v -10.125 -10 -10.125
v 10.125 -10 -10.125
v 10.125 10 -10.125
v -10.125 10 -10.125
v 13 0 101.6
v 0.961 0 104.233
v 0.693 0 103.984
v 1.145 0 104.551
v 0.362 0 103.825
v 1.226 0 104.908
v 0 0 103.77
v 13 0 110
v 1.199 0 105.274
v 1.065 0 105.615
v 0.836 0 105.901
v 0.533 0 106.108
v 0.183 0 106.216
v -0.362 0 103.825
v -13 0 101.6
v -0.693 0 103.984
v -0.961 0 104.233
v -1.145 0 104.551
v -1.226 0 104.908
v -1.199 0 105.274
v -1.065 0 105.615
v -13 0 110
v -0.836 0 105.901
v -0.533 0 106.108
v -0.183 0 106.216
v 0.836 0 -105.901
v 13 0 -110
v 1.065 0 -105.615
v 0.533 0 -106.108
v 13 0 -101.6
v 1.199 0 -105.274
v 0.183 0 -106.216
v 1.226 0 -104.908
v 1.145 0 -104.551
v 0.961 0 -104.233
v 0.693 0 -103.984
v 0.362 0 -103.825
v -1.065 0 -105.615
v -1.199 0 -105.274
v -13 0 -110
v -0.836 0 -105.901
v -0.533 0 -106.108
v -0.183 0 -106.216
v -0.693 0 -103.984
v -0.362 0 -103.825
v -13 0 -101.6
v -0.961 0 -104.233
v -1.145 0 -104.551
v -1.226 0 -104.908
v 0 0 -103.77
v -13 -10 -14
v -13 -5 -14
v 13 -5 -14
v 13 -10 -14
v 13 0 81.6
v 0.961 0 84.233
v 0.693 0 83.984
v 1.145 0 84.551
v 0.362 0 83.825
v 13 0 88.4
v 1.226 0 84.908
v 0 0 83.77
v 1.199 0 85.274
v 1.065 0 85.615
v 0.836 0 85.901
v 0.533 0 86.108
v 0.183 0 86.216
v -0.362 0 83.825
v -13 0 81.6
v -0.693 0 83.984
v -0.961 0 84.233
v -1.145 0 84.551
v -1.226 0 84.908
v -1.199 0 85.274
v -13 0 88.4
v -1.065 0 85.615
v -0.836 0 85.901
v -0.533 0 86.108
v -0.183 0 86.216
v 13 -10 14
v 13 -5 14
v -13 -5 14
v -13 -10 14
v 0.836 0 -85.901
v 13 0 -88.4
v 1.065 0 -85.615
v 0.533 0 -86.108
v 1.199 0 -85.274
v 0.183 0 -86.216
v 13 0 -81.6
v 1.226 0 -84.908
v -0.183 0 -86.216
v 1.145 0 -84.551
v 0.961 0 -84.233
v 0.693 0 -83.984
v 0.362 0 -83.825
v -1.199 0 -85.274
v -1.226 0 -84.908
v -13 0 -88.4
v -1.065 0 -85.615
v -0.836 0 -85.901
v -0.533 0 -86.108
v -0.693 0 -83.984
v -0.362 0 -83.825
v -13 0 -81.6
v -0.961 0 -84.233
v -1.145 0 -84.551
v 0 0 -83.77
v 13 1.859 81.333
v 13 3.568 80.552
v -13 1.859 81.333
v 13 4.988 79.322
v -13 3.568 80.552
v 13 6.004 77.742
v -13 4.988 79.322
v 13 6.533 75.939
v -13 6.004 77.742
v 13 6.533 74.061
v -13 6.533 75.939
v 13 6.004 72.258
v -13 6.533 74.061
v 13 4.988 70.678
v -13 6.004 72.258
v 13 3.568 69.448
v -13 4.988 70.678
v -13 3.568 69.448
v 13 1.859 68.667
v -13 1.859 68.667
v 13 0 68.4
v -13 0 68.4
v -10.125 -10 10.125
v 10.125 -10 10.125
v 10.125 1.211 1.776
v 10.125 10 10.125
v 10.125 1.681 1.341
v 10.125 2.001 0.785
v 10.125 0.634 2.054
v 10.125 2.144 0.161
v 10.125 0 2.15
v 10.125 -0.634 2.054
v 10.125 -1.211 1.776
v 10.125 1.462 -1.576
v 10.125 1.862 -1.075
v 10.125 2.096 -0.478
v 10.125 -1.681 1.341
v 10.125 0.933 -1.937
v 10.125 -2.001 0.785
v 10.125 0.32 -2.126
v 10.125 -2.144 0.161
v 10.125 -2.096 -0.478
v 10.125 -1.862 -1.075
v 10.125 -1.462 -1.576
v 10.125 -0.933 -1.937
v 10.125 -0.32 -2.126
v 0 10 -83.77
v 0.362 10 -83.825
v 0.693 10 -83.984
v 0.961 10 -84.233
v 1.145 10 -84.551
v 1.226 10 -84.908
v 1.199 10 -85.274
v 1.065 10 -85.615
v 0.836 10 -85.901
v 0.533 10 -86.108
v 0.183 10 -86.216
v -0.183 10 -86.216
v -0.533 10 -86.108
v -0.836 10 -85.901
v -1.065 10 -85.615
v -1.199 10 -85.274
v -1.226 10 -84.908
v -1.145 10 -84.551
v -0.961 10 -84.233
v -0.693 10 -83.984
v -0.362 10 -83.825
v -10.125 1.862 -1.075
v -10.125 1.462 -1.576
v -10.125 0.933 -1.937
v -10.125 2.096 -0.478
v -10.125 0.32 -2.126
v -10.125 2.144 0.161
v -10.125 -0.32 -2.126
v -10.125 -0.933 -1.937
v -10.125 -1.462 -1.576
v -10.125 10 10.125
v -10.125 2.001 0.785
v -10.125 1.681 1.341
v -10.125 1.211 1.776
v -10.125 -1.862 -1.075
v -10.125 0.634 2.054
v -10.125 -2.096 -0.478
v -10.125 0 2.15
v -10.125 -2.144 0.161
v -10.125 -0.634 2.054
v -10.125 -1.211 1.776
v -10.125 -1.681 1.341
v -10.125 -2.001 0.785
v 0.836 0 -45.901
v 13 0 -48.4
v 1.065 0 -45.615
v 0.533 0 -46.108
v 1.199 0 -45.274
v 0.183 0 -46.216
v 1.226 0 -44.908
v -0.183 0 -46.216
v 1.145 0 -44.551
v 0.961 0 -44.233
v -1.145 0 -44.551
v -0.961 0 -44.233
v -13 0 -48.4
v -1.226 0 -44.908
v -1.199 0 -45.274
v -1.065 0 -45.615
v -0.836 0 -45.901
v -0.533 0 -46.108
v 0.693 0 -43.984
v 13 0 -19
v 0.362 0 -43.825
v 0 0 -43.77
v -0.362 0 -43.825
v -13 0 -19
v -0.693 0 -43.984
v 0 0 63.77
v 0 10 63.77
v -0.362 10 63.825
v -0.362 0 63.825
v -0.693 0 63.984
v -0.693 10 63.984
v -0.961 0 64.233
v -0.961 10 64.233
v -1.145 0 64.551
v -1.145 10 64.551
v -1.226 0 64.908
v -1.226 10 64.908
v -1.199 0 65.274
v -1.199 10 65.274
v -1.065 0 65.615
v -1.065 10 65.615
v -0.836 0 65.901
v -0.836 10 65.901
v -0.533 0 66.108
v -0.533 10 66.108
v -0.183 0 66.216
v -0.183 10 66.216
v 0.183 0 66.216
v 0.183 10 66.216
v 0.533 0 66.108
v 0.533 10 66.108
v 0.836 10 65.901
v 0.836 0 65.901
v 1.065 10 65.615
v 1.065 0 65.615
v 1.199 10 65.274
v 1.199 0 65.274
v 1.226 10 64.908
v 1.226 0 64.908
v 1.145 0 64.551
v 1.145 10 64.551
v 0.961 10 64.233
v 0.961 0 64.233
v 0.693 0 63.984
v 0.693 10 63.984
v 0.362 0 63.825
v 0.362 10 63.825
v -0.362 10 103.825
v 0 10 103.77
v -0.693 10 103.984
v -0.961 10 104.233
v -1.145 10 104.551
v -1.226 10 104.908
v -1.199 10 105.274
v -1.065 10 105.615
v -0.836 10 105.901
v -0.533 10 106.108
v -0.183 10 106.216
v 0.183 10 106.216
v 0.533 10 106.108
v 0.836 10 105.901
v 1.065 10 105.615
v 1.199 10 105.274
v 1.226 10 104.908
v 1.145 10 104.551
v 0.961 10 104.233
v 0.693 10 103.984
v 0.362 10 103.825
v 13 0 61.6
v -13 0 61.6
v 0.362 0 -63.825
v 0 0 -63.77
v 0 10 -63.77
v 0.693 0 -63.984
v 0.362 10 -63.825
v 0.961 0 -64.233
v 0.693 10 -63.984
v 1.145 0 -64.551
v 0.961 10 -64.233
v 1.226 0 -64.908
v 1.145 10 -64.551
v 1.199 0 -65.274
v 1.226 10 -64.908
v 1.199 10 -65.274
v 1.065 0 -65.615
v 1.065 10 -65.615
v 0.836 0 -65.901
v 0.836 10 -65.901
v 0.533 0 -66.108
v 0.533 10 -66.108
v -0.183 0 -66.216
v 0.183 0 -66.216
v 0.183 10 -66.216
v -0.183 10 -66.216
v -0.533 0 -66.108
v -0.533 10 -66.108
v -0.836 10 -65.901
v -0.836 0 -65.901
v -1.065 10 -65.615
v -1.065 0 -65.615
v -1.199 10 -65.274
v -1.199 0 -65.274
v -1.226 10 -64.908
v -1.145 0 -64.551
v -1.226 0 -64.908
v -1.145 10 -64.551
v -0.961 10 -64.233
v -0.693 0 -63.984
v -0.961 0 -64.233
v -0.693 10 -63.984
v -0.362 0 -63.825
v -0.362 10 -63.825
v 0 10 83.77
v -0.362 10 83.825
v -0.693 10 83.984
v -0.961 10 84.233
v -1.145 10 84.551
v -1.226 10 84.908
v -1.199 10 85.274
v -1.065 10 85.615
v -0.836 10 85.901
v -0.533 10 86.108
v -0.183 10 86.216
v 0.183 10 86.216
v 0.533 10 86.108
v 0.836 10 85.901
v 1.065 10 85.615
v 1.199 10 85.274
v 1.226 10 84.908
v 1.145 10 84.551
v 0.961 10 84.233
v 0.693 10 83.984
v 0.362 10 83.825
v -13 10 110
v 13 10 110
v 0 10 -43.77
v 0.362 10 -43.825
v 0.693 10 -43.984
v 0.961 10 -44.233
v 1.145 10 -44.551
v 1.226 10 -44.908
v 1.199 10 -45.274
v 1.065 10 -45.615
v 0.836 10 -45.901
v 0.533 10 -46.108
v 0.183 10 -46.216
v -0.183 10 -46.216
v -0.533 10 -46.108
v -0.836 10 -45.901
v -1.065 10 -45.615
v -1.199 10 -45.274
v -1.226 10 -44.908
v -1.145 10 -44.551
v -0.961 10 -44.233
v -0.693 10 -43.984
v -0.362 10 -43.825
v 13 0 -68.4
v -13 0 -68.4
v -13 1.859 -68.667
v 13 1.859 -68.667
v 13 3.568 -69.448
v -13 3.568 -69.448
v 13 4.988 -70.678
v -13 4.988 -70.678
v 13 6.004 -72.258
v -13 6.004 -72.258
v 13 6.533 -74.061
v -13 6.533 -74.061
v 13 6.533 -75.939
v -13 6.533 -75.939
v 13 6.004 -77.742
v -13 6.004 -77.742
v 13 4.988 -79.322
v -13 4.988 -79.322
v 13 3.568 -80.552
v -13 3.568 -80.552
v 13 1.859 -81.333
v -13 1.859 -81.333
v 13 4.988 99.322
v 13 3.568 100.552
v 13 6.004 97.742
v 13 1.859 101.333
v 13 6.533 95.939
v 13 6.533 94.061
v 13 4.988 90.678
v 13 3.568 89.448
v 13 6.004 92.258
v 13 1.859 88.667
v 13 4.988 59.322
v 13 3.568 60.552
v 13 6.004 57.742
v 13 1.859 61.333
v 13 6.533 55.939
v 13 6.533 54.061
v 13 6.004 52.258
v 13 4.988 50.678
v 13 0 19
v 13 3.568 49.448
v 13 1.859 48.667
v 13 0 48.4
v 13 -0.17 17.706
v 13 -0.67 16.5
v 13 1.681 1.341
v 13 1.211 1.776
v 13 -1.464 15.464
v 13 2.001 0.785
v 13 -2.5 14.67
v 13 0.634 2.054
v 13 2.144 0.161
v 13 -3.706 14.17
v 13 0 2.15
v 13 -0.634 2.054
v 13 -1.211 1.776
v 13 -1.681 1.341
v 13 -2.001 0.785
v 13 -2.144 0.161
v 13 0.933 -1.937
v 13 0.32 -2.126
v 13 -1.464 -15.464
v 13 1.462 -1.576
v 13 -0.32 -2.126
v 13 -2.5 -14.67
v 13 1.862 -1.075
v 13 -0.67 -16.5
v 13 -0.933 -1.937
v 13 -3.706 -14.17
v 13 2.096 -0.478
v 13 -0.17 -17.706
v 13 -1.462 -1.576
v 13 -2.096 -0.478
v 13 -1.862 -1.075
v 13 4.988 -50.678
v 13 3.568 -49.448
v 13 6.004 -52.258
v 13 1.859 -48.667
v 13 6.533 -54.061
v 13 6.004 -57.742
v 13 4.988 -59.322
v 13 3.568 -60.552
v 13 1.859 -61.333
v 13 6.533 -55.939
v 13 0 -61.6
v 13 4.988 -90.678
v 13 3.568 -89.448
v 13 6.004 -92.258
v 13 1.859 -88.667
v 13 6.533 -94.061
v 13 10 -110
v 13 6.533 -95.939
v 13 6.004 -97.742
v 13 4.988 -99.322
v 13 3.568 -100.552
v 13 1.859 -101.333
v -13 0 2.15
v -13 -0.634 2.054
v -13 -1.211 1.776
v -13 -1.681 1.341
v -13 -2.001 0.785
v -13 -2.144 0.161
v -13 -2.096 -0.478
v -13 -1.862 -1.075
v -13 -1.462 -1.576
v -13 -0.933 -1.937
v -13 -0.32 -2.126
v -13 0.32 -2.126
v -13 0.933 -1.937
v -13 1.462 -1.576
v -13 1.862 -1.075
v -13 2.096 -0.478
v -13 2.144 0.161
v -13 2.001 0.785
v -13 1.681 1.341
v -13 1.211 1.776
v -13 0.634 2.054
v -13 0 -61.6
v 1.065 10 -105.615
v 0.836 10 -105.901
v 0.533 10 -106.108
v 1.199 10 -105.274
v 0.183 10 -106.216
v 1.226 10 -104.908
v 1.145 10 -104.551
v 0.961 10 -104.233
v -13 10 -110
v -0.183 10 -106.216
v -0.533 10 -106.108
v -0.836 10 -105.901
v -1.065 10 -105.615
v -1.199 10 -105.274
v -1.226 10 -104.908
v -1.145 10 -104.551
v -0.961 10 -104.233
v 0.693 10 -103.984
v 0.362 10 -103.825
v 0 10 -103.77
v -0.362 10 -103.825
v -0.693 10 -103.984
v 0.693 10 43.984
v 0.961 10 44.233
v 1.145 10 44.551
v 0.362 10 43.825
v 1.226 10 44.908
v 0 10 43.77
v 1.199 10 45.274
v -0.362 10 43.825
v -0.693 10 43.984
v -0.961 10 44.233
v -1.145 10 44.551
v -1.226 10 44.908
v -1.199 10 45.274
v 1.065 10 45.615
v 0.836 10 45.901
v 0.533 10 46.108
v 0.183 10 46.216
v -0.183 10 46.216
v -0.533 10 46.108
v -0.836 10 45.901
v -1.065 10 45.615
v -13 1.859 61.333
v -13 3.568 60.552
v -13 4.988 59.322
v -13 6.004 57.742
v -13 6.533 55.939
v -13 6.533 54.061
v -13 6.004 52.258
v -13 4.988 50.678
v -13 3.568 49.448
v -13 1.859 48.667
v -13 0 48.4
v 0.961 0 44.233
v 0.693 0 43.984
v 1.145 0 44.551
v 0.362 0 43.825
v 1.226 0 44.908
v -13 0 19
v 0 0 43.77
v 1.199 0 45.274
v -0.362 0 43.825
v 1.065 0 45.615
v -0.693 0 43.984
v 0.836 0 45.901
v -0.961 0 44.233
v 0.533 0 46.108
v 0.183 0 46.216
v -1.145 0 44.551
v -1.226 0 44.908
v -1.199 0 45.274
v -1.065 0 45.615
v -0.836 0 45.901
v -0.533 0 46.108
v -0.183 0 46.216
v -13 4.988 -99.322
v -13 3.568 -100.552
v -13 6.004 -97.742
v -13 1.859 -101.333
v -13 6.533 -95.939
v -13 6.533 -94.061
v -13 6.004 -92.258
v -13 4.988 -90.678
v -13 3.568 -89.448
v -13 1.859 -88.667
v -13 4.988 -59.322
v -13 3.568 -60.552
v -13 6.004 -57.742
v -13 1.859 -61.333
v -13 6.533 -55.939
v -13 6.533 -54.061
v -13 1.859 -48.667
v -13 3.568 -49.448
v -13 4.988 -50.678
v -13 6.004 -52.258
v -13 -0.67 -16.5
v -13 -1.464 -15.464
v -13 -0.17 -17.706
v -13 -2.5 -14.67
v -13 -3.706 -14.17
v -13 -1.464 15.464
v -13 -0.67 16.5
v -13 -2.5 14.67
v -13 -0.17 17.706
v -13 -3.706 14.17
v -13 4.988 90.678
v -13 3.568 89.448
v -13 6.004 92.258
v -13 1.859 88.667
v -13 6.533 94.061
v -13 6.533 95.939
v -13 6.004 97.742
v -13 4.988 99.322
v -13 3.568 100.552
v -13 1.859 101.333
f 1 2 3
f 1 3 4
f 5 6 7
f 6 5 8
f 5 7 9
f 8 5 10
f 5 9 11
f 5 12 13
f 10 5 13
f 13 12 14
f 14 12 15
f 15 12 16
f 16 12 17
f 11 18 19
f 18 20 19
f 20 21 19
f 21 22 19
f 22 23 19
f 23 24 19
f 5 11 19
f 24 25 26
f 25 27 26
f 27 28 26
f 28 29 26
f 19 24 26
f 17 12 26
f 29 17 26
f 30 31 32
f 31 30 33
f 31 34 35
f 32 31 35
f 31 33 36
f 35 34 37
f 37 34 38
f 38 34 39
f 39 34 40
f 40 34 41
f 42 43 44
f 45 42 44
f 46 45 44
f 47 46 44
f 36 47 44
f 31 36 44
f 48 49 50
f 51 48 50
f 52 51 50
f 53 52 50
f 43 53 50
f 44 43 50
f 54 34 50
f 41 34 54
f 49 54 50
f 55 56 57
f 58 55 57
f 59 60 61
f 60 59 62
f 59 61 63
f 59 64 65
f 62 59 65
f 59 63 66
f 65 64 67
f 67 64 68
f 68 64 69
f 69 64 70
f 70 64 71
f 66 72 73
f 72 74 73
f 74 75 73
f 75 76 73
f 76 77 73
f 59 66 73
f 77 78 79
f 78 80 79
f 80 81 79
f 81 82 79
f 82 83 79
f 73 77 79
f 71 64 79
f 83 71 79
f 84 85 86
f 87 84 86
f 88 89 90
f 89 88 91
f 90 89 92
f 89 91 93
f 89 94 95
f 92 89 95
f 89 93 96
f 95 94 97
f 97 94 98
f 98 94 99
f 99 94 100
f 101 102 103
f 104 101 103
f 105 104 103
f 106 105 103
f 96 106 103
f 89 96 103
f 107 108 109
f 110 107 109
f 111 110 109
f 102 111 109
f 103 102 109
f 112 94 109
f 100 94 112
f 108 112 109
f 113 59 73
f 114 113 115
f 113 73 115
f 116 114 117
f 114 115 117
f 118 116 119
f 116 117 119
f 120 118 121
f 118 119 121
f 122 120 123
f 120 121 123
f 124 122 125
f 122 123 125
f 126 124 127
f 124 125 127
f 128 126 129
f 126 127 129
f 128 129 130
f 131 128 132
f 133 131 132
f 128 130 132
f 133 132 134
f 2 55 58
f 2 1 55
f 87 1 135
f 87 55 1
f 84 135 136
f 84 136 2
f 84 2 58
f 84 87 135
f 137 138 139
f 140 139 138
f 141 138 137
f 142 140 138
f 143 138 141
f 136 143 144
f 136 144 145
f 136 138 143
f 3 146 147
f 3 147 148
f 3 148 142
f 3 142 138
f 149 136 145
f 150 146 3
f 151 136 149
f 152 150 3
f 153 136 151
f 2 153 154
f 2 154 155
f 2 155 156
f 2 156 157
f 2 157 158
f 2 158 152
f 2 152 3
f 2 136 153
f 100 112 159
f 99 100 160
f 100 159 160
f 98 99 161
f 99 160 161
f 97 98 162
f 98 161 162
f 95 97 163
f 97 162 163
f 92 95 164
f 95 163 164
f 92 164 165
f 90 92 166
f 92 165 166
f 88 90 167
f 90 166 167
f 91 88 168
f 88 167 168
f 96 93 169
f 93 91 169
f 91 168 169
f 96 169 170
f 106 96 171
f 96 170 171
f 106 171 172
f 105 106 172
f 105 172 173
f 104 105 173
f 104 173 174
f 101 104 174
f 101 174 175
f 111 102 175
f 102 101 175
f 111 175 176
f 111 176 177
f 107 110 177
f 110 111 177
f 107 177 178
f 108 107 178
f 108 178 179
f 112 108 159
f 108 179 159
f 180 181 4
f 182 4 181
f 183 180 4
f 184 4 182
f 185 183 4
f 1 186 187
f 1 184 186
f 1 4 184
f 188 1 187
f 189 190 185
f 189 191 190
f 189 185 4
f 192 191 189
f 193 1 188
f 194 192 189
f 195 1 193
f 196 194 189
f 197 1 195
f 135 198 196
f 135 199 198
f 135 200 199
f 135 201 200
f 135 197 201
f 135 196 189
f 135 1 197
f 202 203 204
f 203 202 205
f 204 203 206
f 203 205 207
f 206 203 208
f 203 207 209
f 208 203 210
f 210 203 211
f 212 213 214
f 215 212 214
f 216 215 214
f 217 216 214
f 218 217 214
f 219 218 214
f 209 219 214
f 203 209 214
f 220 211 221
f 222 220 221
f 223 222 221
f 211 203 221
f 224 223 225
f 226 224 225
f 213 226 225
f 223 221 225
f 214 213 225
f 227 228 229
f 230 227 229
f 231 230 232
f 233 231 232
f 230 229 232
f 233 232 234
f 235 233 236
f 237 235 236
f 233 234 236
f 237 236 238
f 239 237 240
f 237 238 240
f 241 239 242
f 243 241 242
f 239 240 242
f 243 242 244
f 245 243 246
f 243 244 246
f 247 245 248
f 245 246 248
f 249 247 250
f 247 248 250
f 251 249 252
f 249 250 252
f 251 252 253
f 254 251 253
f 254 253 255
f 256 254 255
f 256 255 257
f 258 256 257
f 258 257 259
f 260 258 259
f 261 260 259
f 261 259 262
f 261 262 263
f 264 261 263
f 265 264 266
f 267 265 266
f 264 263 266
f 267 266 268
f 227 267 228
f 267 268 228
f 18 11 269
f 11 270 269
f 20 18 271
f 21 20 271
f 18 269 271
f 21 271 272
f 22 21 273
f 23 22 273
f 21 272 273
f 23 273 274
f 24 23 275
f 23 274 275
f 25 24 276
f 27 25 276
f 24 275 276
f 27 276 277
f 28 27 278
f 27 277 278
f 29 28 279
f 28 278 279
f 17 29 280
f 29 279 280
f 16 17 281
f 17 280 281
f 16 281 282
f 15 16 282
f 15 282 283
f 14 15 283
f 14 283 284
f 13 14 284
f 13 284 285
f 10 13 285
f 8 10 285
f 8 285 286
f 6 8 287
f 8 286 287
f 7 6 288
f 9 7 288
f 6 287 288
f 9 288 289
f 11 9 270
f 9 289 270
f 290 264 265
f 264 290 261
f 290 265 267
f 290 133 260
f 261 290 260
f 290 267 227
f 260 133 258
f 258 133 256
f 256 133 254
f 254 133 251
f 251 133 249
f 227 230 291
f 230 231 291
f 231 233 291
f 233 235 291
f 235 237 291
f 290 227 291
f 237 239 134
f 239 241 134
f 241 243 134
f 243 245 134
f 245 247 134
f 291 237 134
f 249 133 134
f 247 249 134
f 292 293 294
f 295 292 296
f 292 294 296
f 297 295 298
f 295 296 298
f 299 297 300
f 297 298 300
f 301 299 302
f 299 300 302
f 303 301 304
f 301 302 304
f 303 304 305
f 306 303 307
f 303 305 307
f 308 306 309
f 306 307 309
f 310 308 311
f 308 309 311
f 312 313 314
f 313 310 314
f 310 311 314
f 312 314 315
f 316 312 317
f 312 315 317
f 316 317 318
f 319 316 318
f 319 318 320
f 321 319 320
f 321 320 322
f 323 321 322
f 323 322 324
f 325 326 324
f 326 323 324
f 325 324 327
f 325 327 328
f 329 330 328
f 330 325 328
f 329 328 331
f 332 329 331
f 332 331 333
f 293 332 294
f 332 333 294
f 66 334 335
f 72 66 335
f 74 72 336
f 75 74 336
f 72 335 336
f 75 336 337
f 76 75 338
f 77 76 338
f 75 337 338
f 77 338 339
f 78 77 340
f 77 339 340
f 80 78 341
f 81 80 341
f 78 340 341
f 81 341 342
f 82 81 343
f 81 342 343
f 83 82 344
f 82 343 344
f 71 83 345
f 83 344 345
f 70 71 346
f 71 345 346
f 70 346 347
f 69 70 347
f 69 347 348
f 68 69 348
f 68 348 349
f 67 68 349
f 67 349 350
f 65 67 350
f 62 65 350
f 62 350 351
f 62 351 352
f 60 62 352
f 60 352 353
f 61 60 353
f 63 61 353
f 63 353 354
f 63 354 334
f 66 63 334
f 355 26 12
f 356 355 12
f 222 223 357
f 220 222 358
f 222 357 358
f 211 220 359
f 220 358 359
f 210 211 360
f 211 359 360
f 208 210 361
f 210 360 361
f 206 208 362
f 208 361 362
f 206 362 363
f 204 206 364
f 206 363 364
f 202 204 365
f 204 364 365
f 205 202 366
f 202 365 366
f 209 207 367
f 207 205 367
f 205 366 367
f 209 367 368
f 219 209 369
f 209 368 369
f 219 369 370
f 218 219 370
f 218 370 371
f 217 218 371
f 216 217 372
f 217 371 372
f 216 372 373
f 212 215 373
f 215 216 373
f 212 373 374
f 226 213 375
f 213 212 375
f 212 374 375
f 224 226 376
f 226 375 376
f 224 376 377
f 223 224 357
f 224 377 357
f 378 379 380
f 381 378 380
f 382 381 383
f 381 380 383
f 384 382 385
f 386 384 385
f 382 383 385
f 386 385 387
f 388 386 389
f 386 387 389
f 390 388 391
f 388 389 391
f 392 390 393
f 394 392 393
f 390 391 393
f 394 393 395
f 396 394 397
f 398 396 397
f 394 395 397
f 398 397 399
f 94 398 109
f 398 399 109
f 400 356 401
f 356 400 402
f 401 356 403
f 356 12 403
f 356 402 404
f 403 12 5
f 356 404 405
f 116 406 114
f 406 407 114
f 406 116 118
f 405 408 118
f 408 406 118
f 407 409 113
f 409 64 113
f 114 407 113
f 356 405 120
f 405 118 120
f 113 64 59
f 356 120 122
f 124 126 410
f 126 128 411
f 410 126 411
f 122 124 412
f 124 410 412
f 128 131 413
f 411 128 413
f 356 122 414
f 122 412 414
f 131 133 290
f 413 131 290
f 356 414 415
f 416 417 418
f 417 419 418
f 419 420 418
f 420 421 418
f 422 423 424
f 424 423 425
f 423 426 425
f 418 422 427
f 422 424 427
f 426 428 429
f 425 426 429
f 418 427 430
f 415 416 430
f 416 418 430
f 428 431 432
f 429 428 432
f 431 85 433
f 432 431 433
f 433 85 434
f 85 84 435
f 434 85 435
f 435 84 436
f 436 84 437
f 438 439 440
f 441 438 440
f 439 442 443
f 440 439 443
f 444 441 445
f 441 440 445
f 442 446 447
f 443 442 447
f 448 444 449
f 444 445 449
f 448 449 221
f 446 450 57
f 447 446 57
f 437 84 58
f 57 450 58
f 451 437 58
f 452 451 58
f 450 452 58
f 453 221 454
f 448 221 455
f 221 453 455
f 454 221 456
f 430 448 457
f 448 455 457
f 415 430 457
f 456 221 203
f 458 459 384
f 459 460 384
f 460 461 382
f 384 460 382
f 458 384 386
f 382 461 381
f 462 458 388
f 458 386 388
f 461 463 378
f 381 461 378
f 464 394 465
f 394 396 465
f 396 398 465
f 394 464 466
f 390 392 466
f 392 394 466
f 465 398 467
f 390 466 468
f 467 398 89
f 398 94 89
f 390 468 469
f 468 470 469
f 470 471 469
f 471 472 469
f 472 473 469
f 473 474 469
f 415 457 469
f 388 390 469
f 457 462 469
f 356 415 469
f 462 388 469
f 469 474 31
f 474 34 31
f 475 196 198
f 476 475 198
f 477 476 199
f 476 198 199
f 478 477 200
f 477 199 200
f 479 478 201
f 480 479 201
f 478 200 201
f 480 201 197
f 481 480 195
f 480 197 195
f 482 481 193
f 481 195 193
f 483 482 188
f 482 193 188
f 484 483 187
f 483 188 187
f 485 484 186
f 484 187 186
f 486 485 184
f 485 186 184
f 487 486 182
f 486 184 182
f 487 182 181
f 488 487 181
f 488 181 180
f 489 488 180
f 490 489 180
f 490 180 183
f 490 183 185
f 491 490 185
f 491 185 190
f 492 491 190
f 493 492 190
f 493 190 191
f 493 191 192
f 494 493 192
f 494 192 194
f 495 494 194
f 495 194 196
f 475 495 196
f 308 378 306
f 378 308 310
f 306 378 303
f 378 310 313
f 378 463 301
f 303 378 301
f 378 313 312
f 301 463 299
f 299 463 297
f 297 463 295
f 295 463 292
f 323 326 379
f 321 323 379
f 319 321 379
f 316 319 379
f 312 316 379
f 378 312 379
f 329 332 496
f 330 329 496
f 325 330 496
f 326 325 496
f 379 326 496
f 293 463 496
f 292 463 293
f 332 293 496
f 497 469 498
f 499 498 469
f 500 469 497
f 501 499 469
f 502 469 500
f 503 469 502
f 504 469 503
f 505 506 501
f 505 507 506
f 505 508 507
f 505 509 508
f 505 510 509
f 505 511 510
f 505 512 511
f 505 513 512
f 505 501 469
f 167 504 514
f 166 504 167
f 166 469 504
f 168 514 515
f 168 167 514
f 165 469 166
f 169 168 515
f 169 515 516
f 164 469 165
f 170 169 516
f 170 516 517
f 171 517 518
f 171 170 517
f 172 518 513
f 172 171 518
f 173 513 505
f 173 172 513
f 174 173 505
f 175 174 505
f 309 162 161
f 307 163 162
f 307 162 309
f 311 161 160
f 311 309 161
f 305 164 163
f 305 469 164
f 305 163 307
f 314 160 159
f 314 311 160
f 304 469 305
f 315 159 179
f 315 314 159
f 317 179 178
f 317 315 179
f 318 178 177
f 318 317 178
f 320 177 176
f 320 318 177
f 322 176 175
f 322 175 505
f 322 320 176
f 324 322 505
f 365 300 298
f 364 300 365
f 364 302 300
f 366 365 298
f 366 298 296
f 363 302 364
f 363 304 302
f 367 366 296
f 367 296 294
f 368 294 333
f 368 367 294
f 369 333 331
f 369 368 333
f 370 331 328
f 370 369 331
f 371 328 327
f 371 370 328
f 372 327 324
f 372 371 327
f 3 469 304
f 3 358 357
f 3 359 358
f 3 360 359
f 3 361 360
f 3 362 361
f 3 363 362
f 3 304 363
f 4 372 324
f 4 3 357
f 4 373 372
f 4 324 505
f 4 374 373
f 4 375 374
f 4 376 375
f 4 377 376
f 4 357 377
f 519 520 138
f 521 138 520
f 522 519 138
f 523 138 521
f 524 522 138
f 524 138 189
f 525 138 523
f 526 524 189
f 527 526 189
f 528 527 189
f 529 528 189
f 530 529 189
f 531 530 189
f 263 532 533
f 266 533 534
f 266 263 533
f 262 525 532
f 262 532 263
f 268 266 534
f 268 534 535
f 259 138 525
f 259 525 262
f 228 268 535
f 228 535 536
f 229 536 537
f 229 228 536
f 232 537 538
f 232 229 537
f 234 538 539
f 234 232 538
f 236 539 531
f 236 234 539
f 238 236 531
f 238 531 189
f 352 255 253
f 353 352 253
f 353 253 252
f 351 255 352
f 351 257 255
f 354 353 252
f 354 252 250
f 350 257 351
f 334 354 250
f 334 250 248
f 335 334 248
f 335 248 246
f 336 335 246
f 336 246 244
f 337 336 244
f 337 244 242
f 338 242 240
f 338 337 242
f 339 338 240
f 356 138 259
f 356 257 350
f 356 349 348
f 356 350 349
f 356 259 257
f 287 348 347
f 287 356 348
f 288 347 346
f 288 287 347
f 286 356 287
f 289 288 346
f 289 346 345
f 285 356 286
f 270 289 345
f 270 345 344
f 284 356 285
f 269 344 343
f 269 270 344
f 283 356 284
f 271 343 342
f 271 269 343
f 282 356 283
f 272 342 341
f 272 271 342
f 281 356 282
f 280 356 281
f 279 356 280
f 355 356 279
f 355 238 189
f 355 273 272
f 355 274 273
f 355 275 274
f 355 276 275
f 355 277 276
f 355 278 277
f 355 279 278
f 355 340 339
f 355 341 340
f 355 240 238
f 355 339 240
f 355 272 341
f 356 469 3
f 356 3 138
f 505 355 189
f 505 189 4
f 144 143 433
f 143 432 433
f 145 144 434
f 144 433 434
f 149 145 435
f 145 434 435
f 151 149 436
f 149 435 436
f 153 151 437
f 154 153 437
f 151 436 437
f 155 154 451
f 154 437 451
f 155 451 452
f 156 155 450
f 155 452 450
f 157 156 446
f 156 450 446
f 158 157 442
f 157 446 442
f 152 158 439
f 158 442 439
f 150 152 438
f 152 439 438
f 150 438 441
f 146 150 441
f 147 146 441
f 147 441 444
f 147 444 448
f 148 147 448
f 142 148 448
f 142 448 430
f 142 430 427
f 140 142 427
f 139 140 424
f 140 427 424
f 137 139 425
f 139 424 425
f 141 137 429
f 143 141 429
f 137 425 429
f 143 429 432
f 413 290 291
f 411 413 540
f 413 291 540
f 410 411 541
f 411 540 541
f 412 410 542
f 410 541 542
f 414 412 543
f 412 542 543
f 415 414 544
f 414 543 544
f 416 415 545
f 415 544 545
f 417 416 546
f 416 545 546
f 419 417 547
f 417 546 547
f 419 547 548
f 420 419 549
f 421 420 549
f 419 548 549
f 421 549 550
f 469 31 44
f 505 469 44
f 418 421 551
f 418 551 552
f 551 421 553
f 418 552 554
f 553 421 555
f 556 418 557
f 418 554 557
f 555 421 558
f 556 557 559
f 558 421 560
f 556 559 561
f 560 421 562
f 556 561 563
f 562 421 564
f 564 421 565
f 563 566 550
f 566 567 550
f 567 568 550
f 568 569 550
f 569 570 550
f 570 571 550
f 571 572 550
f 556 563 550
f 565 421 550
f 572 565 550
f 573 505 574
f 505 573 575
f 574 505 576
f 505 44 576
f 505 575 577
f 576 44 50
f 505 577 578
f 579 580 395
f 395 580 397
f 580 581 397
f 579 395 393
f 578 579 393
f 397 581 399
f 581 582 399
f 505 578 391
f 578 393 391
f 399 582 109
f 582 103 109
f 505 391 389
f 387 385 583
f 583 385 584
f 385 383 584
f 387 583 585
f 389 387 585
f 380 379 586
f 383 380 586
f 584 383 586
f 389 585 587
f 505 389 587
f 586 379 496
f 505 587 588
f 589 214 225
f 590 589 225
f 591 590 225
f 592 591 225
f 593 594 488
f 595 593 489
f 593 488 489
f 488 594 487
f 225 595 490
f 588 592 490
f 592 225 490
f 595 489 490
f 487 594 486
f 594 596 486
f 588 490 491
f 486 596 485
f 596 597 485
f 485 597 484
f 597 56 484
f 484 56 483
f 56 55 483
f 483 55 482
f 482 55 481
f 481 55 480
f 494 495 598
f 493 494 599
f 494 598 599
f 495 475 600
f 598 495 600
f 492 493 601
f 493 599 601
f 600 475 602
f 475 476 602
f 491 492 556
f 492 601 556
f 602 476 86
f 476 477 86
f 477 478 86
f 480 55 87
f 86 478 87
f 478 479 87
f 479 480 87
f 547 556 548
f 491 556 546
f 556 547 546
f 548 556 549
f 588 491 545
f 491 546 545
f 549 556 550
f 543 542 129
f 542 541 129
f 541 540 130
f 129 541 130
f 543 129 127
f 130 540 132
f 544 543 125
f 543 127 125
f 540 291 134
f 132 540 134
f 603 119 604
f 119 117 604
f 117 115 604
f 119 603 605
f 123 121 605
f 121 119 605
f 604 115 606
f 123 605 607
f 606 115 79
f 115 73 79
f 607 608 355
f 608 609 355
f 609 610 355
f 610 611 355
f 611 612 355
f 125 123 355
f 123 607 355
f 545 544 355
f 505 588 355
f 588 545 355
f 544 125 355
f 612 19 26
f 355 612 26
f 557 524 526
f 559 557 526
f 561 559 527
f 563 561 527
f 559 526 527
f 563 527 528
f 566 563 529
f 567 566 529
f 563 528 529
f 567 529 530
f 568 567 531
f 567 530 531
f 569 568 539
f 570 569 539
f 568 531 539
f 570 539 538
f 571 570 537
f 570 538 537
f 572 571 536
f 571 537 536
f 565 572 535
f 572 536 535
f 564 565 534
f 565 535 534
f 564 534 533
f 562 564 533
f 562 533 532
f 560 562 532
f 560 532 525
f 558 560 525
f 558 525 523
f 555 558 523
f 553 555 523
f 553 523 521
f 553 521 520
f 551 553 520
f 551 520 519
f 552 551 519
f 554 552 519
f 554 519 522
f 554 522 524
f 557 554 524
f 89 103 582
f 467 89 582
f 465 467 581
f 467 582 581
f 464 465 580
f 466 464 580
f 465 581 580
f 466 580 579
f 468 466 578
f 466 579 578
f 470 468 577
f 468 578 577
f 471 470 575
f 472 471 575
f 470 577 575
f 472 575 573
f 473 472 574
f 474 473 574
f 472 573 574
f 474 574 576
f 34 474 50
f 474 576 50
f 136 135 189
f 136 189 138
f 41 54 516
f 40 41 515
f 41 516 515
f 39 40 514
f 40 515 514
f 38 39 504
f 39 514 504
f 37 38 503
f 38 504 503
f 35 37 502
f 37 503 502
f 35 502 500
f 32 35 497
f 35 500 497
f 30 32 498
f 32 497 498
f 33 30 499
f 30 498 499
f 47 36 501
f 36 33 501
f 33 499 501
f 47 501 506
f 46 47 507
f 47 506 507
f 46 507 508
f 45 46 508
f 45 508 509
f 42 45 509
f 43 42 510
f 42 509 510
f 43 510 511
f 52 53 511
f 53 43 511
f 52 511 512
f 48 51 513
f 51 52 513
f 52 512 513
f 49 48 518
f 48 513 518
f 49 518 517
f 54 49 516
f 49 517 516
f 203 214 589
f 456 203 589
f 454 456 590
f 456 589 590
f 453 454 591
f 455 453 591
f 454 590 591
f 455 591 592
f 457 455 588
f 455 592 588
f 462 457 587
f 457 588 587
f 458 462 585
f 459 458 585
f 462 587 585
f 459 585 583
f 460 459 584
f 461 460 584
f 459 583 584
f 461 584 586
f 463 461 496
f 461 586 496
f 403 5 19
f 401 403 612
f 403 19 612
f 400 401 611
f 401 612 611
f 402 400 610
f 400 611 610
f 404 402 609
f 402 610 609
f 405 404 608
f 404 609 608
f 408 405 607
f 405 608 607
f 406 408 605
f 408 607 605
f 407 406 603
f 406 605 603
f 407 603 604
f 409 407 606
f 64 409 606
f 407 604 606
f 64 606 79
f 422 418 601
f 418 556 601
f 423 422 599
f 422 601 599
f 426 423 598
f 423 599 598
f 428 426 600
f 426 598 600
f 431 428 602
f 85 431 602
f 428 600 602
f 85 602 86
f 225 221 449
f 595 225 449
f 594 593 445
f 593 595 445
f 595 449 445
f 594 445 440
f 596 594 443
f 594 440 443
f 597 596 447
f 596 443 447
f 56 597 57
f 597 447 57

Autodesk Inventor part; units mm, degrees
ref_plane "YZ Plane" through (0, 0, 0) normal (1, 0, 0) x (0, 1, 0)
ref_plane "XZ Plane" through (0, 0, 0) normal (0, 1, 0) x (-1, 0, 0)
ref_plane "XY Plane" through (0, 0, 0) normal (0, 0, 1) x (1, 0, 0)
sketch "Sketch1" plane through (0, 0, 0) normal (0, 1, 0) x (-1, 0, 0)
  line L0 (-13, -110) -> (13, -110)
  line L1 (13, -110) -> (13, 110)
  line L2 (13, 110) -> (-13, 110)
  line L3 (-13, 110) -> (-13, -110)
  line L4 (-13, -110) -> (13, 110) construction
  line L5 (13, -110) -> (-13, 110) construction
  point P0 (0, 0)
  dimension "d0" = 220
  dimension "d1" = 26
extrude "Extrusion1" add sketch "Sketch1" along normal blind 10
sketch "Sketch3" plane through (0, 0, 0) normal (0, -1, 0) x (1, 0, 0)
  line L0 (13, 110) -> (13, -110) projected
  line L1 (-13, -14) -> (13, -14)
  line L2 (13, -14) -> (13, 14)
  line L3 (13, 14) -> (-13, 14)
  line L4 (-13, 14) -> (-13, -14)
  line L5 (-13, -14) -> (13, 14) construction
  line L6 (13, -14) -> (-13, 14) construction
  point P0 (0, 0)
  dimension "d4" = 28
extrude "Extrusion2" add sketch "Sketch3" along normal blind 10
sketch "Sketch4" plane through (0, -10, 0) normal (0, -1, 0) x (1, 0, 0)
  line L0 (-10.125, 10.125) -> (10.125, 10.125)
  line L1 (10.125, 10.125) -> (10.125, -10.125)
  line L2 (10.125, -10.125) -> (-10.125, -10.125)
  line L3 (-10.125, -10.125) -> (-10.125, 10.125)
  line L4 (-10.125, 10.125) -> (10.125, -10.125) construction
  line L5 (10.125, 10.125) -> (-10.125, -10.125) construction
  point P0 (0, 0)
  dimension "d7" = 20.25
  dimension "d8" = 20.25
extrude "Extrusion3" cut sketch "Sketch4" against normal through all
sketch "Sketch5" plane through (-13, 0, 110) normal (-1, 0, 0) x (0, 0, 1)
  point P0 (-110, 0)
hole "Hole1" at (-13, 0, 0) direction (1, 0, 0) diameter 4.3 end through all clearance for "Flat Head Machine Screw" size "M4" standard "Ansi Metric M Profile"
sketch "Sketch6" plane through (-13, 0, 110) normal (-1, 0, 0) x (0, 0, 1)
  circle A0 centre (-35, 0) radius 6.6
  line L0 (-96, 0) -> (0, 0) projected
  point P0 (-110, 0)
  dimension "d18" = 75
  dimension "d19" = 13.2
extrude "Extrusion4" cut sketch "Sketch6" against normal through all
sketch "Sketch7" plane through (0, 0, 0) normal (0, -1, 0) x (1, 0, 0)
  line L0 (-13, 81.6) -> (13, 81.6) projected
  line L1 (-13, 68.4) -> (-13, 81.6) projected
  line L2 (13, 68.4) -> (-13, 68.4) projected
  line L3 (13, 81.6) -> (13, 68.4) projected
  line L4 (0, 85) -> (0, 65)
  point P0 (0, 0)
  point P1 (0, 75)
  point P2 (13, 75)
  point P3 (0, 68.4)
  dimension "d22" = 20
hole "Hole2" at (0, 0, 65) at (0, 0, 85) direction (0, 1, 0) diameter 2.459 end through all thread size "M3x0.5" class "6H" standard "ANSI Metric M Profile"
pattern_linear "Rectangular Pattern1" count 2 spacing 20 along (0, 0, 1) count 2 spacing 20 along (0, 0, -1) of "Extrusion4"
pattern_linear "Rectangular Pattern2" count 2 spacing 20 along (0, 0, 1) count 2 spacing 20 along (0, 0, -1) of "Hole2"
mirror "Mirror1" about plane through (0, 0, 0) normal (0, 0, 1) of "Extrusion4", "Hole2", "Rectangular Pattern1", "Rectangular Pattern2"
fillet "Fillet1" radius 5 2 edges at (0, 0, 14) (0, 0, -14)
properties part number "holder"
